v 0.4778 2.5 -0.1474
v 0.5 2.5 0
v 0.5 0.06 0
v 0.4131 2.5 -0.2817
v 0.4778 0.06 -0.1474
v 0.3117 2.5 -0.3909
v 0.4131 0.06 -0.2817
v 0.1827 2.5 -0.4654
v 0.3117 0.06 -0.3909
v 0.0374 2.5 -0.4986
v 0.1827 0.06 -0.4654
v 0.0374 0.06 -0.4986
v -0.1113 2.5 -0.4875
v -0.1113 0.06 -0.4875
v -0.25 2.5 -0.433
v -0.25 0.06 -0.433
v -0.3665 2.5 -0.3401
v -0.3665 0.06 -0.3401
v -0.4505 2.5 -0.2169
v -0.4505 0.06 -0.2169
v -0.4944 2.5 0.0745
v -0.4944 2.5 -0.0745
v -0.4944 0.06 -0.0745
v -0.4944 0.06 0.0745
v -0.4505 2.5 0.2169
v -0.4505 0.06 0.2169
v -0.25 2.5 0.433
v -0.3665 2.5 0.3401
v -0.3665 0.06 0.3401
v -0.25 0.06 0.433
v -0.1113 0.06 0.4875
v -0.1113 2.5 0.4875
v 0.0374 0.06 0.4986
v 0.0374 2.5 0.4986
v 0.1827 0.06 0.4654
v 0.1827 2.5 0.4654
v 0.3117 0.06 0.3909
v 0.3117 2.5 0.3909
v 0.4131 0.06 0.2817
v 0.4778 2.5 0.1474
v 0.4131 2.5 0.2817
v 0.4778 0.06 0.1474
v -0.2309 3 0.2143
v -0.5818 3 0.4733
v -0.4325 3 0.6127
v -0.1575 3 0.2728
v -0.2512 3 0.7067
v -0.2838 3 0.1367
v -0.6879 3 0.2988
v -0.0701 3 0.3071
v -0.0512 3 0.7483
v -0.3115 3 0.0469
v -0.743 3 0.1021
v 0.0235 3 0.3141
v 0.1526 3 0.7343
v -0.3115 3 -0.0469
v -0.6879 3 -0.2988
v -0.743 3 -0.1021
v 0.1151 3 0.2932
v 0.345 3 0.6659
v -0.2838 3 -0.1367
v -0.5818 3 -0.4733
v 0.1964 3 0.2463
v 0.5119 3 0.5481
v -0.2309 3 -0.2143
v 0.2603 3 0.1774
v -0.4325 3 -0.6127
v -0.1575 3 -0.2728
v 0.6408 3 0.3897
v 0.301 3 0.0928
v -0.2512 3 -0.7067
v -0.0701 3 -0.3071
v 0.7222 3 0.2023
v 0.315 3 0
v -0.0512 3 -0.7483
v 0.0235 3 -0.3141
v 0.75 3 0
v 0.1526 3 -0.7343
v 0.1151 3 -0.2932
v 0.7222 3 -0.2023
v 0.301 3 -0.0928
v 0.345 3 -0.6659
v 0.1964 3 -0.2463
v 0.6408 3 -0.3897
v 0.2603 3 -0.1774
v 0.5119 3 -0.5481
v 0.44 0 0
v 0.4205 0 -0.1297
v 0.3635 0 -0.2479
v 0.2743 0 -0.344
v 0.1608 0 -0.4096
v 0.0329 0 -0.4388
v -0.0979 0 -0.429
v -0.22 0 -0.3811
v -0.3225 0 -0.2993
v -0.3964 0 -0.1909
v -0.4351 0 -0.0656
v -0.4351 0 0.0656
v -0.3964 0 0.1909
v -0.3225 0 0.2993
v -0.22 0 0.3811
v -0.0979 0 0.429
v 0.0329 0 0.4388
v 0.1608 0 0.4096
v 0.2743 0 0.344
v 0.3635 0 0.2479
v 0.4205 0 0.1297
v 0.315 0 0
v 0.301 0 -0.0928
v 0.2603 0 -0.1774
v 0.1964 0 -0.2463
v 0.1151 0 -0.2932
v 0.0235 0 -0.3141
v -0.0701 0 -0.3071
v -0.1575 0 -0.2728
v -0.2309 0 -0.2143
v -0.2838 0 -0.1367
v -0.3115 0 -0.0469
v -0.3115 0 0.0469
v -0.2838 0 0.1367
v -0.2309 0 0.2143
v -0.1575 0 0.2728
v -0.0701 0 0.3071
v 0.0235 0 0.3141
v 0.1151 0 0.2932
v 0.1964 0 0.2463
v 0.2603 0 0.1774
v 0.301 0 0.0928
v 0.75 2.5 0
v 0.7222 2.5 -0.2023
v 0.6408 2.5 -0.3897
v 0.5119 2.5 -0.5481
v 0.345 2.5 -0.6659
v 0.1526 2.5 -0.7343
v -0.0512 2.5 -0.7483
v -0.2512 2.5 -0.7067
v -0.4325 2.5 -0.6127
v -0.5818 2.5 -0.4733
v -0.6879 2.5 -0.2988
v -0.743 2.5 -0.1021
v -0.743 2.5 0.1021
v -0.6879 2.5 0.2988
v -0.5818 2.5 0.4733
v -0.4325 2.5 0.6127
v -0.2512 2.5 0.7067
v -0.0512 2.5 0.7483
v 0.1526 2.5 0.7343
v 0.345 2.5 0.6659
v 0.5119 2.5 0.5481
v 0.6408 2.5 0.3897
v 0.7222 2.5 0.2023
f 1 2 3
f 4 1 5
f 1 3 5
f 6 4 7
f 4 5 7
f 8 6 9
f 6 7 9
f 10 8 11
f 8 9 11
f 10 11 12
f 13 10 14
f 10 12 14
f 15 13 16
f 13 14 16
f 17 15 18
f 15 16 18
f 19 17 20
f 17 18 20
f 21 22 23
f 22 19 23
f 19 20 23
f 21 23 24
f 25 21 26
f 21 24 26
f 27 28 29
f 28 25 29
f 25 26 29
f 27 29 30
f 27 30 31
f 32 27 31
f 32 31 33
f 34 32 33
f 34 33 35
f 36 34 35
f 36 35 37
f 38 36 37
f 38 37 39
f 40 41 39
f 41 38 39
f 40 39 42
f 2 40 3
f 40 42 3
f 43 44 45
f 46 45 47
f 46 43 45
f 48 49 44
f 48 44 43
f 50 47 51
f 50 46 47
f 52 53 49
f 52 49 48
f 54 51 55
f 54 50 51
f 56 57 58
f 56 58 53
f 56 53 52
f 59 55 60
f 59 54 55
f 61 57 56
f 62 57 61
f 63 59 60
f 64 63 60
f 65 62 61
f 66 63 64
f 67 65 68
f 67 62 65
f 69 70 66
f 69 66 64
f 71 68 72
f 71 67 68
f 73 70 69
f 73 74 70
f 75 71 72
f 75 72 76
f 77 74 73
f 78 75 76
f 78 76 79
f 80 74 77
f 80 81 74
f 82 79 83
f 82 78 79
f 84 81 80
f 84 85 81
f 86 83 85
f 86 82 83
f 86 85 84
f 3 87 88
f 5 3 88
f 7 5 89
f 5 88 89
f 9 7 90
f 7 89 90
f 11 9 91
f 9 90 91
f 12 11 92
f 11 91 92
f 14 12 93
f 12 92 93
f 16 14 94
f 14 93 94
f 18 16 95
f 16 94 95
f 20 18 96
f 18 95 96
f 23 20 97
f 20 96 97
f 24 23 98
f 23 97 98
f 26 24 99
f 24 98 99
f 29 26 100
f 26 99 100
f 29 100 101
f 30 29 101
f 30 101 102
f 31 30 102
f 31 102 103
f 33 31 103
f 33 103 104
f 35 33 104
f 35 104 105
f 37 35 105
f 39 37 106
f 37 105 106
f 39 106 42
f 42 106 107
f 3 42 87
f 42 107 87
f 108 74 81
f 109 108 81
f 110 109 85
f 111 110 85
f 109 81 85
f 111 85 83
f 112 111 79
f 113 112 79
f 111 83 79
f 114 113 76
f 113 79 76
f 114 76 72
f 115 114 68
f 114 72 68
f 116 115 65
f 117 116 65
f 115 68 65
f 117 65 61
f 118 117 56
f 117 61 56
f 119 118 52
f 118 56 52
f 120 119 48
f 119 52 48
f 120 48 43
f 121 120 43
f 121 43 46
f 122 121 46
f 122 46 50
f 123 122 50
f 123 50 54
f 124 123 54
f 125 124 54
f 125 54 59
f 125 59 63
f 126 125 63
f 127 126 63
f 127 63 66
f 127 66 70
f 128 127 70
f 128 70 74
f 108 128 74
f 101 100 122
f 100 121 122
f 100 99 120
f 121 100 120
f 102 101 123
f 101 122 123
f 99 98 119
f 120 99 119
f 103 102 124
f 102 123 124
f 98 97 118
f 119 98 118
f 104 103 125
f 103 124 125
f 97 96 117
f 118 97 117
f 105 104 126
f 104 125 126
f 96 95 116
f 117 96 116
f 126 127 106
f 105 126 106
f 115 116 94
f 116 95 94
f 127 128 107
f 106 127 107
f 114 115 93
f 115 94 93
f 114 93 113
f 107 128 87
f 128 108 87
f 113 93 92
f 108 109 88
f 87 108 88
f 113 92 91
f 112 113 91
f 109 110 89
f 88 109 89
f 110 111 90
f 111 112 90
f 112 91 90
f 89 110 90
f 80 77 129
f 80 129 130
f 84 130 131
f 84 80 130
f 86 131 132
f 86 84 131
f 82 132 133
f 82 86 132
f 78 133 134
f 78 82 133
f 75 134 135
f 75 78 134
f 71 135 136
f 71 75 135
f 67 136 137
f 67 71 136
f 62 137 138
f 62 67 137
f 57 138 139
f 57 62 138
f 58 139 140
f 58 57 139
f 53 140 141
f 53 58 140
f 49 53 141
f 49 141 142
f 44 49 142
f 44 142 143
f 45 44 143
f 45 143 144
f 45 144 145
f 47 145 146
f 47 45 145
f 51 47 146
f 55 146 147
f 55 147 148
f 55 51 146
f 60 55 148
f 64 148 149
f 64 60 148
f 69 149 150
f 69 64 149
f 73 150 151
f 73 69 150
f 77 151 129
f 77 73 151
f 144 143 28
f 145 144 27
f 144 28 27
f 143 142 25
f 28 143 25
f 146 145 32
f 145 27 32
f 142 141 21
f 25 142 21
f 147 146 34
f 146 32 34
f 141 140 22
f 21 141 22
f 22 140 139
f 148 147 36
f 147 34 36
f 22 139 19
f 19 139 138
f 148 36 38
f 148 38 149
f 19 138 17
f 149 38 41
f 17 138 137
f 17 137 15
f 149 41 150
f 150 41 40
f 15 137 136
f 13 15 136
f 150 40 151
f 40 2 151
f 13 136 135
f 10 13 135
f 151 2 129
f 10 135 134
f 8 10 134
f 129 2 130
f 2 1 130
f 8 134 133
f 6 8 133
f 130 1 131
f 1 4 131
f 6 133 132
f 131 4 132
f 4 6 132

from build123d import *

# Parameters (mm, degrees)
SKETCH1_R           = 0.5
BOSS_EXTRUDE1_DEPTH = 3
SKETCH2_R           = 0.75
BOSS_EXTRUDE2_DEPTH = 0.5
CHAMFER1_SIZE       = 0.06
CUT_EXTRUDE1_START  = 3
SKETCH3_R           = 0.315
CUT_EXTRUDE1_DEPTH  = 4


with BuildPart() as part:
    # Sketch1 → Boss-Extrude1 (new body)
    with BuildSketch(Plane(origin=(0, 0, 0), x_dir=(1, 0, 0), z_dir=(0, 1, 0))):
        Circle(SKETCH1_R)
    extrude(amount=BOSS_EXTRUDE1_DEPTH)

    # Sketch2 → Boss-Extrude2 (add)
    with BuildSketch(Plane(origin=(0, 3, 0), x_dir=(1, 0, 0), z_dir=(0, 1, 0))):
        Circle(SKETCH2_R)
    extrude(amount=-BOSS_EXTRUDE2_DEPTH)

    # Chamfer1
    chamfer1_edges = [part.edges().sort_by_distance(p)[0] for p in [
        (-0.5, 0, 0),
    ]]
    chamfer(chamfer1_edges, length=CHAMFER1_SIZE)

    # Sketch3 → Cut-Extrude1 (cut, through all)
    with BuildSketch(Plane(origin=(0, 0, 0), x_dir=(1, 0, 0), z_dir=(0, 1, 0)).offset(CUT_EXTRUDE1_START)):
        Circle(SKETCH3_R)
    extrude(amount=-CUT_EXTRUDE1_DEPTH, mode=Mode.SUBTRACT)


solid = part.part
